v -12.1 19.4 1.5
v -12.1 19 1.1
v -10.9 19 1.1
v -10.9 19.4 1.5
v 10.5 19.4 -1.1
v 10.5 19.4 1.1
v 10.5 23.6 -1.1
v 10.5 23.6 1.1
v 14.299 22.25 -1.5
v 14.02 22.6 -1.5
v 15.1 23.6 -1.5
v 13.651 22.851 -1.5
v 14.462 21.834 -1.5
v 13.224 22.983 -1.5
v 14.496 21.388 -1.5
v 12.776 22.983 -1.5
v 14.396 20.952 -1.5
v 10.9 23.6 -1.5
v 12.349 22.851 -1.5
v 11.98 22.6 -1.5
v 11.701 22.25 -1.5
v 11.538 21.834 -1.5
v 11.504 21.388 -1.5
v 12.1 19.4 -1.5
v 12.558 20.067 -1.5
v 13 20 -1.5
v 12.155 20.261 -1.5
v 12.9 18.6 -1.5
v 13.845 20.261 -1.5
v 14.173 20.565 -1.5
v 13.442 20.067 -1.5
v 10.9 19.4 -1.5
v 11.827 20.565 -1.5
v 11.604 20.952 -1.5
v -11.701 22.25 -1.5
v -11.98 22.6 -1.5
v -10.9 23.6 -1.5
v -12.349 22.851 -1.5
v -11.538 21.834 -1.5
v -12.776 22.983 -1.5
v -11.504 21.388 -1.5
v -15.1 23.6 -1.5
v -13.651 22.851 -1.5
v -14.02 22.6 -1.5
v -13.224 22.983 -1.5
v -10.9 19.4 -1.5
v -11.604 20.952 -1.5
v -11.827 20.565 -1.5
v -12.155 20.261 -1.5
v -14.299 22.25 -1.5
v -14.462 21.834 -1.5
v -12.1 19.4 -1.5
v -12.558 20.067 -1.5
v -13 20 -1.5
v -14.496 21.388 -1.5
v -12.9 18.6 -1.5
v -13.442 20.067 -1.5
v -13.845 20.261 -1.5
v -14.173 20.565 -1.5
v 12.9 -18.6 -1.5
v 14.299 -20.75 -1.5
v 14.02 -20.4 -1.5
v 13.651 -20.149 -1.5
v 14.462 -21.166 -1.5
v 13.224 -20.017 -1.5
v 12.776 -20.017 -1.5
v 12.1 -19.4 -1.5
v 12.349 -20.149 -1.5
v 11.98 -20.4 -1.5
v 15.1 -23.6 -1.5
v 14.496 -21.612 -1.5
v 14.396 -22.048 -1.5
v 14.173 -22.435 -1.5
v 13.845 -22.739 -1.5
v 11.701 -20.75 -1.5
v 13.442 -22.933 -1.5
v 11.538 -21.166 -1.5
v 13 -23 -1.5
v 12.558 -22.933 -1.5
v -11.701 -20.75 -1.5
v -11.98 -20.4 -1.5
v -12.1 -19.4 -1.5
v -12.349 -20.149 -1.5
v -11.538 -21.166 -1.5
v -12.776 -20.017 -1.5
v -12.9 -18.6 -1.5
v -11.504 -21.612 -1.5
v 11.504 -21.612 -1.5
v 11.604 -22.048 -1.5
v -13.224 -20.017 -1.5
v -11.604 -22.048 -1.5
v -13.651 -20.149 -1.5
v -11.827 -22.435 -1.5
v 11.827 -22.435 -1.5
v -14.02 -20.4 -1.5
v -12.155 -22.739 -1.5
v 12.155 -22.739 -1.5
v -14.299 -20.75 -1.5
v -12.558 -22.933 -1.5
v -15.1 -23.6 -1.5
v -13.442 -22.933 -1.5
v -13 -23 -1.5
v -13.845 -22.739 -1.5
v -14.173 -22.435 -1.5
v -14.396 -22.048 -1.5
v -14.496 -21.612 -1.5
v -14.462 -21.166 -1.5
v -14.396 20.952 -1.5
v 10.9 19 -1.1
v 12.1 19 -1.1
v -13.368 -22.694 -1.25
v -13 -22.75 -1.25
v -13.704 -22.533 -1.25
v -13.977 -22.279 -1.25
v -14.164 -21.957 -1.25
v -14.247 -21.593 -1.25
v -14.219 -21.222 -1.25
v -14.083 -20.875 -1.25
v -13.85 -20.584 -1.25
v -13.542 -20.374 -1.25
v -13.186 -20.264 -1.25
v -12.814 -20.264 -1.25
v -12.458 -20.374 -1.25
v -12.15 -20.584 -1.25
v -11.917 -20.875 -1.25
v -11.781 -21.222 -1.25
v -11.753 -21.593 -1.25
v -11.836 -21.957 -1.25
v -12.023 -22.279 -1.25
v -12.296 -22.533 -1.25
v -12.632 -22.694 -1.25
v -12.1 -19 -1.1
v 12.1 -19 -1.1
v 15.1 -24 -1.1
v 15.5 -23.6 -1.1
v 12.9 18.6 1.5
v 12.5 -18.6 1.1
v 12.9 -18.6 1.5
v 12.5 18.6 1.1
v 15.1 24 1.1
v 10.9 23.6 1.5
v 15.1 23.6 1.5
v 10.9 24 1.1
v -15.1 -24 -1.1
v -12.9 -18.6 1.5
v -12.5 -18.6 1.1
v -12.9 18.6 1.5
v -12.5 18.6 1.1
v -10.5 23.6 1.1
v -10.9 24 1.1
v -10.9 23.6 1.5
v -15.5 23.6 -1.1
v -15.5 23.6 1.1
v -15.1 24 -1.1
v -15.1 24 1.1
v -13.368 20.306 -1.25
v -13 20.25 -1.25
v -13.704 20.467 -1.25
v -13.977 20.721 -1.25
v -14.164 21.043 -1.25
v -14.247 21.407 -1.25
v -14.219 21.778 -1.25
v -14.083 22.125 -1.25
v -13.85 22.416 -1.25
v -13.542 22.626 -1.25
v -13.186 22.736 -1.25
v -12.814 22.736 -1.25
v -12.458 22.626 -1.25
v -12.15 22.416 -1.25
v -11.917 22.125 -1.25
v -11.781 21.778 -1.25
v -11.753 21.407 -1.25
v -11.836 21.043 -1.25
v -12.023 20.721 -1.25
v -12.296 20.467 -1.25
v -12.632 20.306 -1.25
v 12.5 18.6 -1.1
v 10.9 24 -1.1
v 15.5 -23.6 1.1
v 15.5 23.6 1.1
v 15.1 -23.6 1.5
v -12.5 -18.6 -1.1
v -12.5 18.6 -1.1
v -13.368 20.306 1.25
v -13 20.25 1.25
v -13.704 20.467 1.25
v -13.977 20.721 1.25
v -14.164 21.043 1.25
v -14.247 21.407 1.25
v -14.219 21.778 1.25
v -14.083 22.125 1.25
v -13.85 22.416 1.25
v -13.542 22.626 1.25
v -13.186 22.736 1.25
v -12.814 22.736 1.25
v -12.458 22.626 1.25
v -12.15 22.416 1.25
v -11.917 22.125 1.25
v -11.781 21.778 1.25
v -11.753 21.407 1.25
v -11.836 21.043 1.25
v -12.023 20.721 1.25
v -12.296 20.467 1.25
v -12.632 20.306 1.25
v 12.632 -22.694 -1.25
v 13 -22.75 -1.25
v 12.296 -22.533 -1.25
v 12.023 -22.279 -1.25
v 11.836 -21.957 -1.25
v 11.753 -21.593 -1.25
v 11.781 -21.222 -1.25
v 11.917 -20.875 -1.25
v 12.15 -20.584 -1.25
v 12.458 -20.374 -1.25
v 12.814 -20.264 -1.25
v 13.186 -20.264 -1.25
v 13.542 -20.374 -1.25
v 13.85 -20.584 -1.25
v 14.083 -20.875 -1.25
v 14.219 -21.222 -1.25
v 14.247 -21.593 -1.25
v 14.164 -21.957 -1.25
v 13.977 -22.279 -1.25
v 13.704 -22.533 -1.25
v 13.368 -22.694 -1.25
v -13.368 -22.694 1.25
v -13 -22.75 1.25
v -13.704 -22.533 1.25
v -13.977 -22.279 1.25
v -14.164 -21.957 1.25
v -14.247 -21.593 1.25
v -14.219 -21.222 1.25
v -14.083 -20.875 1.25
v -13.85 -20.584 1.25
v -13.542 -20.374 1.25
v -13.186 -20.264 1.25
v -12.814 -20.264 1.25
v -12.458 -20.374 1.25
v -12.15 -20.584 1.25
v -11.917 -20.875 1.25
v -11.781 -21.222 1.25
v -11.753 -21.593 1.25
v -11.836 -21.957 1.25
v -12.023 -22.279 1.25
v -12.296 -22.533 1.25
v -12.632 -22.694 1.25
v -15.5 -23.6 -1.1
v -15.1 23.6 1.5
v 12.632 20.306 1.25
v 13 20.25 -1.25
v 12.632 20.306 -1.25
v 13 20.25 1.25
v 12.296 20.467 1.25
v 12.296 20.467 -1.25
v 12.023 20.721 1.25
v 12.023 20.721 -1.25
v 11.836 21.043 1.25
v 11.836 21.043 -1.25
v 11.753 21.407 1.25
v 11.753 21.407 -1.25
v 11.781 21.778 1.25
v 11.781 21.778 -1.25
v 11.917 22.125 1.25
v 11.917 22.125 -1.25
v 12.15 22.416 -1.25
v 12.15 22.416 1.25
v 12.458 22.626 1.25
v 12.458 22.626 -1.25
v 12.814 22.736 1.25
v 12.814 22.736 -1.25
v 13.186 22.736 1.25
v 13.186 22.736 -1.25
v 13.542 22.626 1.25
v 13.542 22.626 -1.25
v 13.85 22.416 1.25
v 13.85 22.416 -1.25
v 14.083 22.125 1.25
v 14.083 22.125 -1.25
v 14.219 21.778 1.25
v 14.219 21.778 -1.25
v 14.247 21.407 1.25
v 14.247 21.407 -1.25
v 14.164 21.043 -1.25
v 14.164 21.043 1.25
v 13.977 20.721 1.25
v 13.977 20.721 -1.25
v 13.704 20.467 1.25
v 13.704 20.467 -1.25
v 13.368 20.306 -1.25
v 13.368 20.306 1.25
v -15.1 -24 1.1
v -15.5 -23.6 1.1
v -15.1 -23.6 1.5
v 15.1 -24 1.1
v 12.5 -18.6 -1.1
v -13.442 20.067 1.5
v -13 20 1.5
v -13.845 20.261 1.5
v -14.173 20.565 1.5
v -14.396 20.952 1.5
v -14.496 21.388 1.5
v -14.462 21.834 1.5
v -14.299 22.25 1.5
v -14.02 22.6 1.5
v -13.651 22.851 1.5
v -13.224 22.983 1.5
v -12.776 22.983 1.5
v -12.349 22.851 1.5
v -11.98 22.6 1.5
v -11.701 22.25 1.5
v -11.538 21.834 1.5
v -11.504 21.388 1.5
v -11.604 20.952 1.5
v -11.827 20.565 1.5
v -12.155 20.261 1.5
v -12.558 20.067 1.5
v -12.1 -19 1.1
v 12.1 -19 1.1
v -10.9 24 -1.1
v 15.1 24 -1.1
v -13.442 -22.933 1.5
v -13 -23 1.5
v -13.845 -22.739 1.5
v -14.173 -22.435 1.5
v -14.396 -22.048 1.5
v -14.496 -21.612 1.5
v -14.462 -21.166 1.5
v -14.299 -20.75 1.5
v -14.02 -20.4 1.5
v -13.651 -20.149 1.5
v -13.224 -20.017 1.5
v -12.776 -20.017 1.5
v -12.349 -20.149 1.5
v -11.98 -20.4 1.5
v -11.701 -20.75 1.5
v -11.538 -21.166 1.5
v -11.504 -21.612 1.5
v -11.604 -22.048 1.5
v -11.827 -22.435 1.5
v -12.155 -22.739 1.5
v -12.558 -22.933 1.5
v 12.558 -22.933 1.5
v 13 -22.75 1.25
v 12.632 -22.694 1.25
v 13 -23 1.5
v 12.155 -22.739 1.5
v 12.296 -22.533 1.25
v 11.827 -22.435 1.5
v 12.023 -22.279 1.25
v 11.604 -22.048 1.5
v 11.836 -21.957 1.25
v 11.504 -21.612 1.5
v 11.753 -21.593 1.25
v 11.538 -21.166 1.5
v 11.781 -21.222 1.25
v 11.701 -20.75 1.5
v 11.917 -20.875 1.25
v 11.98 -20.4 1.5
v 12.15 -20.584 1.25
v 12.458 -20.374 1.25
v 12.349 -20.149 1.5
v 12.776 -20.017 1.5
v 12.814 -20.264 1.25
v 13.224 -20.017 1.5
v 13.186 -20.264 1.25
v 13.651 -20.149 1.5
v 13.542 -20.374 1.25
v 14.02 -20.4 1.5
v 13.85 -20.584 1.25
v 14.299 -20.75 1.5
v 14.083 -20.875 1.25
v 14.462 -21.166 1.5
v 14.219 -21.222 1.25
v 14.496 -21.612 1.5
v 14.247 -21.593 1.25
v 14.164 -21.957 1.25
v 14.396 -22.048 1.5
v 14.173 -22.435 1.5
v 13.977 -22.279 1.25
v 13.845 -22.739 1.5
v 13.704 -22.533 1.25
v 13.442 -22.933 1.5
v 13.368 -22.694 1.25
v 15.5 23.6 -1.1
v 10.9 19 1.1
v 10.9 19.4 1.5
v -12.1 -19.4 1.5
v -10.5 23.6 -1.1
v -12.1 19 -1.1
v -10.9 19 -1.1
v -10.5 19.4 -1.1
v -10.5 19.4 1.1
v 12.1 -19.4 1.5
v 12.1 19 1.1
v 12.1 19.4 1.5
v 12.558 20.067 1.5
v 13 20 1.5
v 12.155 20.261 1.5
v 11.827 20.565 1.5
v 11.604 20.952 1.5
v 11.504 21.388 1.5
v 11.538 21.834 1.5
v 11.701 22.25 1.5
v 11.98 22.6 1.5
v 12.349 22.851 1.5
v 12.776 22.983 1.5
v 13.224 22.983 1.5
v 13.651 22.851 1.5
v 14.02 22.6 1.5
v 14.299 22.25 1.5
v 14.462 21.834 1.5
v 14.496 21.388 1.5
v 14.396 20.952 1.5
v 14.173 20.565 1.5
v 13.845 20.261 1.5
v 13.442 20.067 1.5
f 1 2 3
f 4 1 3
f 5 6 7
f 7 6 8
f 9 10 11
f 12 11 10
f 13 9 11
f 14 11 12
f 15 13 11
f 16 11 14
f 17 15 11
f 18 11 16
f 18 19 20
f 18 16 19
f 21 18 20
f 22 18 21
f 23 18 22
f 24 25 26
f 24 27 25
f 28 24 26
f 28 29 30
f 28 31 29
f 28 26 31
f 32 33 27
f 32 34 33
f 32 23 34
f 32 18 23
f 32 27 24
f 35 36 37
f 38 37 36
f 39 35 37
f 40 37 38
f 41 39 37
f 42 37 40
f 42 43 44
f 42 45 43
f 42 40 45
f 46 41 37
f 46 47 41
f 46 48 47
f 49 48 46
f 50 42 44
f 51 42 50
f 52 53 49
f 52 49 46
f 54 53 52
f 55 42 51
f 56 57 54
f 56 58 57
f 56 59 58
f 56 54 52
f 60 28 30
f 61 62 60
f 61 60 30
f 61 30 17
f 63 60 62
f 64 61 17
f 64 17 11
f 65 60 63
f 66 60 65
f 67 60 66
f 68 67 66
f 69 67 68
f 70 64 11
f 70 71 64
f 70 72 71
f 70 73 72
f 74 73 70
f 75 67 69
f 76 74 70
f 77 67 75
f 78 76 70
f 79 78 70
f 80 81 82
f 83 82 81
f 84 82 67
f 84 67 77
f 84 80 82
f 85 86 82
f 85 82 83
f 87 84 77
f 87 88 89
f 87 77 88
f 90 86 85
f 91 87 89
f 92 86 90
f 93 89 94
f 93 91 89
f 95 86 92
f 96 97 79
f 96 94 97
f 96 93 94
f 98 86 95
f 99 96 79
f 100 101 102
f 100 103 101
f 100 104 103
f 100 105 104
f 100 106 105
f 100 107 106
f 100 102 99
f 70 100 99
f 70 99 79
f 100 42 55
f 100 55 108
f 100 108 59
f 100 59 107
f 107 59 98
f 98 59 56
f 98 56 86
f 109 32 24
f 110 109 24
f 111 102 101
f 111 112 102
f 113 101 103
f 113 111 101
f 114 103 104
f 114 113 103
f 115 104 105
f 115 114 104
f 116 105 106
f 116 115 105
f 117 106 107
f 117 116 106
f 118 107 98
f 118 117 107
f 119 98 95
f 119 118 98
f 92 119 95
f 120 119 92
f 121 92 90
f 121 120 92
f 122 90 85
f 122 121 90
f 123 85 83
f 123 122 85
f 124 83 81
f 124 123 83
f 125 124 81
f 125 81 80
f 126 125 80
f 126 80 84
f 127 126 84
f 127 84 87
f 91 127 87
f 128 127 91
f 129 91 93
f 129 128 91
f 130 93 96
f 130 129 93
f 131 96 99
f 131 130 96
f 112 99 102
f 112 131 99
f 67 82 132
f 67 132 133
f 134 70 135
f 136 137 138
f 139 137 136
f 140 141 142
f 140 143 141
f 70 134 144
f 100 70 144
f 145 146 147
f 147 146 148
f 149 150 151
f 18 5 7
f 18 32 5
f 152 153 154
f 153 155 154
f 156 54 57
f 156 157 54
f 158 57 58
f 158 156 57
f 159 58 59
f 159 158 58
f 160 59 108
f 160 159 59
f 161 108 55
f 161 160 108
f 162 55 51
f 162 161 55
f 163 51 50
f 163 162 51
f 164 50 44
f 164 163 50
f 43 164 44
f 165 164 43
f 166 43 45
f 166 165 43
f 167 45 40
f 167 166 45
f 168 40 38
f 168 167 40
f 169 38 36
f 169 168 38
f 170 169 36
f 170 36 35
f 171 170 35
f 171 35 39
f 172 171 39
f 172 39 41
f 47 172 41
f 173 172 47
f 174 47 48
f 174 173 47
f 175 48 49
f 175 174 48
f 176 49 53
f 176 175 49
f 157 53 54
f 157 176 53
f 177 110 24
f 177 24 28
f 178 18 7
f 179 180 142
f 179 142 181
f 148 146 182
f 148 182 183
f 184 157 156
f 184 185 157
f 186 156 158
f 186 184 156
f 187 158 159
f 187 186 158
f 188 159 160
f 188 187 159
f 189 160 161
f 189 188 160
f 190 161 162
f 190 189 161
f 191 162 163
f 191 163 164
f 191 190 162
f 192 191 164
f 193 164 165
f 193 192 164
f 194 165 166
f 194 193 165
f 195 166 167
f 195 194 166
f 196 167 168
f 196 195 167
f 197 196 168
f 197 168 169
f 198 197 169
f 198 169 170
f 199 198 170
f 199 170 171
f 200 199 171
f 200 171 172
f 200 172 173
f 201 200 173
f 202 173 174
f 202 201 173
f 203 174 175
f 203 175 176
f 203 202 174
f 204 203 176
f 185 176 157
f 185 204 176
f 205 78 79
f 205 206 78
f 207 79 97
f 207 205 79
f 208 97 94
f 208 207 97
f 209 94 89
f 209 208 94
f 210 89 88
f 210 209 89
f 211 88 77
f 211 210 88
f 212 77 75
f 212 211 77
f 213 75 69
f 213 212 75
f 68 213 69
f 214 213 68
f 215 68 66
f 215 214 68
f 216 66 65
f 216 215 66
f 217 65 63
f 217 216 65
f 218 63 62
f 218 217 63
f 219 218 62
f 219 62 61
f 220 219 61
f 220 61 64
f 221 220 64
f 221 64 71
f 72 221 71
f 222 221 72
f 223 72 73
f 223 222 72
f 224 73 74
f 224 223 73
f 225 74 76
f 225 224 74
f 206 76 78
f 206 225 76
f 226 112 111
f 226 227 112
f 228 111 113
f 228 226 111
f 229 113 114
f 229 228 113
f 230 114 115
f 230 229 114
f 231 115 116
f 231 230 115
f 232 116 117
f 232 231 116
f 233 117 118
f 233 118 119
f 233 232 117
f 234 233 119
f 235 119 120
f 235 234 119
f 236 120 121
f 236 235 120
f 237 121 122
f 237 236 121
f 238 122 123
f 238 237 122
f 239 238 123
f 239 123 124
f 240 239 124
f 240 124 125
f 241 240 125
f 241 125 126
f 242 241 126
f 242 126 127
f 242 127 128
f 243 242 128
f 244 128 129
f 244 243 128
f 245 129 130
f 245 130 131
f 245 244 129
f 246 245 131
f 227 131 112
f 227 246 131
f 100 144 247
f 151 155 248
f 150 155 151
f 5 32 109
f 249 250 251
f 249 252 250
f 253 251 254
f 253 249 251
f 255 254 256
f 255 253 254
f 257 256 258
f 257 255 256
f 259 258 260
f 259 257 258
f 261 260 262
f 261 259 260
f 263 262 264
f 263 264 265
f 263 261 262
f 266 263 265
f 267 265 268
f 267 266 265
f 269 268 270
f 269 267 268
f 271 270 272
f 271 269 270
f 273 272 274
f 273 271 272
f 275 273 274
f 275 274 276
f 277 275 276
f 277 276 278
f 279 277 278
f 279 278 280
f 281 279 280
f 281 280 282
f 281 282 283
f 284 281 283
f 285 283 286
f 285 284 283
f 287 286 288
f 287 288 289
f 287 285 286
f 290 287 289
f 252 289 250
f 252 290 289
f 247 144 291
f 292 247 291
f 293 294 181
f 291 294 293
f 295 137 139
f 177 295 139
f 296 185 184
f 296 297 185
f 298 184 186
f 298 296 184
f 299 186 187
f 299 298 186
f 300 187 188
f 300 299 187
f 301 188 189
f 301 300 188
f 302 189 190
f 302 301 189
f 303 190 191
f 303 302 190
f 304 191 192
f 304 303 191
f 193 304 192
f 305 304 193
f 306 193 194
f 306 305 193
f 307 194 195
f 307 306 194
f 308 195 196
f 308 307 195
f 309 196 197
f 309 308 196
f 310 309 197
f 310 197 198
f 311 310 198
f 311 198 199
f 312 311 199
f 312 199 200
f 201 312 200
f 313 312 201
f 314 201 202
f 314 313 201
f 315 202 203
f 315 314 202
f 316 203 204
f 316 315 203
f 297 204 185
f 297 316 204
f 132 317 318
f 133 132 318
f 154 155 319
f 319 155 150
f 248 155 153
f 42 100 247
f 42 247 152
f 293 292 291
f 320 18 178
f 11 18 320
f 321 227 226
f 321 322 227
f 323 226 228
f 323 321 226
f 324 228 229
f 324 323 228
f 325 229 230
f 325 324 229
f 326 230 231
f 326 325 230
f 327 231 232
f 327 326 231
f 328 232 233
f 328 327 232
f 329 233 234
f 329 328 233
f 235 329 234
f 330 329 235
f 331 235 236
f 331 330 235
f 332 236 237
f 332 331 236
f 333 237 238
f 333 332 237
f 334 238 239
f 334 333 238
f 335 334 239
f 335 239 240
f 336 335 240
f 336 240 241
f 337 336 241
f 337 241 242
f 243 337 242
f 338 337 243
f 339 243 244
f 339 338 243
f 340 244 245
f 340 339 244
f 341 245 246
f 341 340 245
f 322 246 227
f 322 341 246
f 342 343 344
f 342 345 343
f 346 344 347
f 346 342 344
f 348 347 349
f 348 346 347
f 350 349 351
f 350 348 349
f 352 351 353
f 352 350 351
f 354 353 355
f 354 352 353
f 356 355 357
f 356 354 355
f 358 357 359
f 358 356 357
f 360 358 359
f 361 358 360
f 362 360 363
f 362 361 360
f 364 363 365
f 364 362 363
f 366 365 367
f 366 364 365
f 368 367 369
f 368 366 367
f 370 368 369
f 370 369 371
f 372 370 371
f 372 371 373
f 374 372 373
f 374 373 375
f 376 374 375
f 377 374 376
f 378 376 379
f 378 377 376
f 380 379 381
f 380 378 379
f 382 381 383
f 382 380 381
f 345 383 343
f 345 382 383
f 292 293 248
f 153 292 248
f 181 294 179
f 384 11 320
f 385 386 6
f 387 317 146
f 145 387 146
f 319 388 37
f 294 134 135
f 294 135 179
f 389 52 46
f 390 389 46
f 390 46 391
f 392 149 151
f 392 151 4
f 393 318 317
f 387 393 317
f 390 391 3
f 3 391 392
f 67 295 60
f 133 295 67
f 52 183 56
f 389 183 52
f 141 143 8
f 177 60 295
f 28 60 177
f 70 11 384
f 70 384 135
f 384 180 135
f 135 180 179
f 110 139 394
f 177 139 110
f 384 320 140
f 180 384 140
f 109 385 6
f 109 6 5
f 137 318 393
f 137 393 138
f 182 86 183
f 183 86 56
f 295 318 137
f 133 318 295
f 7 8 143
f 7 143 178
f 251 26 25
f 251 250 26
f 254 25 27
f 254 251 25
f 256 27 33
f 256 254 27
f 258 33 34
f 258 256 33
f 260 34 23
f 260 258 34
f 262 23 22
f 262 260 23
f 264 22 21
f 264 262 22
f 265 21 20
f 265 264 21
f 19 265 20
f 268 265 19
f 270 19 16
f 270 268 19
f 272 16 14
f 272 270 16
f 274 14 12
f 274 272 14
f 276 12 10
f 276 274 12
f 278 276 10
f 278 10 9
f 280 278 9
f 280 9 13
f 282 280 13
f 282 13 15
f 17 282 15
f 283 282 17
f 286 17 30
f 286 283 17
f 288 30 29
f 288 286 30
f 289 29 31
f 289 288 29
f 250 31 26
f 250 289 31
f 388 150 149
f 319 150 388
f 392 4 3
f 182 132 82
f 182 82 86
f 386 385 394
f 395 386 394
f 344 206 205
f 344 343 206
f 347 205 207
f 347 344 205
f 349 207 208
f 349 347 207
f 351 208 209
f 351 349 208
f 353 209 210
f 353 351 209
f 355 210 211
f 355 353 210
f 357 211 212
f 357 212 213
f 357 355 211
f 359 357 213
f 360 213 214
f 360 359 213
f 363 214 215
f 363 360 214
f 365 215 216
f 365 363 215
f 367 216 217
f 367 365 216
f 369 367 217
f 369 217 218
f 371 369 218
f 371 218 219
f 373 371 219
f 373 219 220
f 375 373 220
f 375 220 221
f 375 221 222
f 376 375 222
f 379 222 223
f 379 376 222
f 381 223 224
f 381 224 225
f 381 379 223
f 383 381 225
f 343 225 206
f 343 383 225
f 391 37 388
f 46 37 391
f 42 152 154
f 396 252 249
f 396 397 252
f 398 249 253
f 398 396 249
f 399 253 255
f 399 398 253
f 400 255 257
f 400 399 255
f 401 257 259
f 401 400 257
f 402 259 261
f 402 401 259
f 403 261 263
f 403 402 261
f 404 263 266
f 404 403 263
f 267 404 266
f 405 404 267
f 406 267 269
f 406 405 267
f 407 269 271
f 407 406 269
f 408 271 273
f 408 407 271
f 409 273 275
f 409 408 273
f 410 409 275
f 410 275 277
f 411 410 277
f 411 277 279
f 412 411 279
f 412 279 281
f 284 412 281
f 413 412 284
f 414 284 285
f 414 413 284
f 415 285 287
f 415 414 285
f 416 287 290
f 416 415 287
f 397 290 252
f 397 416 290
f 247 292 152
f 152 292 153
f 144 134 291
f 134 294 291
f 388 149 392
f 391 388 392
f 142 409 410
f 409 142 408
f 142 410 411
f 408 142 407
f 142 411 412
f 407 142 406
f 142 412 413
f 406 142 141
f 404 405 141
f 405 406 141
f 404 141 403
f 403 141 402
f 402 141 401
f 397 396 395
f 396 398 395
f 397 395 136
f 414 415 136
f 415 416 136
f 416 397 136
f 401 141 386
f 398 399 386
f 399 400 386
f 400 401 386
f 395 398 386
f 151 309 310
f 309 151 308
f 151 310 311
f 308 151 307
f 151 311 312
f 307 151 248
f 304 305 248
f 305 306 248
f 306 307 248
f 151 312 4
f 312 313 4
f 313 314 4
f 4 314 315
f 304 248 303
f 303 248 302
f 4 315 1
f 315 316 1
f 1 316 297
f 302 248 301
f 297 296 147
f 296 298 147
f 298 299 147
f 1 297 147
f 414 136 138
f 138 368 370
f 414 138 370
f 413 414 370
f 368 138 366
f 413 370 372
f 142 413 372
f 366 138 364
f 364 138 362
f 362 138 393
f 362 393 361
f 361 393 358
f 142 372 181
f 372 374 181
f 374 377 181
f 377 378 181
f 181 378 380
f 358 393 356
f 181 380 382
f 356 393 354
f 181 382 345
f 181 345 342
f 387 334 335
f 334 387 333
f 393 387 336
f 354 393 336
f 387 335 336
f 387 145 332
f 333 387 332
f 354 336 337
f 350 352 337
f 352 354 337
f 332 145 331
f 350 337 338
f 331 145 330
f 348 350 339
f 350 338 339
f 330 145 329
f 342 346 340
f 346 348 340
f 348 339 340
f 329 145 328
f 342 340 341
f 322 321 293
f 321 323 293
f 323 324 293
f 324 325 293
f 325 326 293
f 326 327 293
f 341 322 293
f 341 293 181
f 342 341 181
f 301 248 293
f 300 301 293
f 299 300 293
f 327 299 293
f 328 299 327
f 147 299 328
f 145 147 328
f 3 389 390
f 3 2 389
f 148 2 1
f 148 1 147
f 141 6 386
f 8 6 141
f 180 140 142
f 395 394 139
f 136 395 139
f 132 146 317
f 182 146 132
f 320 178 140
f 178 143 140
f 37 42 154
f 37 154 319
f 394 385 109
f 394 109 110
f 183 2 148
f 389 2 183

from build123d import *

# Parameters (mm, degrees)
AUFSATZ_LINEAR_AUSTRAGEN1_DEPTH           = 1.5
F_2_5_2_5_DURCHMESSER_BOHRUNG1_AT_2_COUNT = 2
F_2_5_2_5_DURCHMESSER_BOHRUNG1_AT_2_PITCH = 25.124689053
F_2_5_2_5_DURCHMESSER_BOHRUNG1_AT_3_COUNT = 2
F_2_5_2_5_DURCHMESSER_BOHRUNG1_AT_3_PITCH = 25.124689053
F_2_5_2_5_DURCHMESSER_BOHRUNG1_AT_4_COUNT = 2
F_2_5_2_5_DURCHMESSER_BOHRUNG1_AT_4_PITCH = 25.124689053
F_2_5_2_5_DURCHMESSER_BOHRUNG1_AT_5_COUNT = 2
F_2_5_2_5_DURCHMESSER_BOHRUNG1_AT_5_PITCH = 25.124689053
SKIZZE4_W                                 = 25
SKIZZE4_H                                 = 38
SCHNITT_LINEAR_AUSTRAGEN1_DEPTH           = 3
FASE1_SIZE                                = 0.4


with BuildPart() as part:
    # Skizze1 → Aufsatz-Linear austragen1 (new, symmetric)
    with BuildSketch(Plane(origin=(0, 0, 0), x_dir=(0, 1, 0), z_dir=(0, 0, 1))):
        Polygon((-24, 15.5), (24, 15.5), (24, 10.5), (-19, 10.5), (-19, -10.5), (24, -10.5), (24, -15.5), (-24, -15.5), align=None)
    extrude(amount=AUFSATZ_LINEAR_AUSTRAGEN1_DEPTH, both=True)

    # Skizze3 → Ø2.5 (2.5) Durchmesser Bohrung1 (revolve, cut)
    with BuildSketch(Plane(origin=(0, 0, 1.5), x_dir=(0, -1, 0), z_dir=(1, 0, 0))):
        Polygon((0, 0), (0, 3), (1.5, 3), (1.25, 2.75), (1.25, 0.25), (1.5, 0), align=None)
    f_2_5_2_5_durchmesser_bohrung1 = revolve(axis=Axis((0, 0, 7.85), (0, 0, -1)), mode=Mode.SUBTRACT)

    # Ø2.5 (2.5) Durchmesser Bohrung1 at 2: Ø2.5 (2.5) Durchmesser Bohrung1 ×2
    with Locations(*[Vector(0.5174193389091943, 0.8557319835805908, 0) * (i * F_2_5_2_5_DURCHMESSER_BOHRUNG1_AT_2_PITCH) for i in range(1, F_2_5_2_5_DURCHMESSER_BOHRUNG1_AT_2_COUNT)]):
        add(f_2_5_2_5_durchmesser_bohrung1, mode=Mode.SUBTRACT)

    # Ø2.5 (2.5) Durchmesser Bohrung1 at 3: Ø2.5 (2.5) Durchmesser Bohrung1 ×2
    with Locations(*[Vector(-0.5174193389091943, -0.8557319835805908, 0) * (i * F_2_5_2_5_DURCHMESSER_BOHRUNG1_AT_3_PITCH) for i in range(1, F_2_5_2_5_DURCHMESSER_BOHRUNG1_AT_3_COUNT)]):
        add(f_2_5_2_5_durchmesser_bohrung1, mode=Mode.SUBTRACT)

    # Ø2.5 (2.5) Durchmesser Bohrung1 at 4: Ø2.5 (2.5) Durchmesser Bohrung1 ×2
    with Locations(*[Vector(0.5174193389091946, -0.8557319835805907, 0) * (i * F_2_5_2_5_DURCHMESSER_BOHRUNG1_AT_4_PITCH) for i in range(1, F_2_5_2_5_DURCHMESSER_BOHRUNG1_AT_4_COUNT)]):
        add(f_2_5_2_5_durchmesser_bohrung1, mode=Mode.SUBTRACT)

    # Ø2.5 (2.5) Durchmesser Bohrung1 at 5: Ø2.5 (2.5) Durchmesser Bohrung1 ×2
    with Locations(*[Vector(-0.5174193389091944, 0.8557319835805907, 0) * (i * F_2_5_2_5_DURCHMESSER_BOHRUNG1_AT_5_PITCH) for i in range(1, F_2_5_2_5_DURCHMESSER_BOHRUNG1_AT_5_COUNT)]):
        add(f_2_5_2_5_durchmesser_bohrung1, mode=Mode.SUBTRACT)

    # Skizze4 → Schnitt-Linear austragen1 (cut)
    with BuildSketch(Plane.XY.offset(1.5)):
        Rectangle(SKIZZE4_W, SKIZZE4_H)
    extrude(amount=-SCHNITT_LINEAR_AUSTRAGEN1_DEPTH, mode=Mode.SUBTRACT)

    # Fase1
    fase1_edges = [part.edges().sort_by_distance(p)[0] for p in [
        (10.5, 21.5, -1.5),
        (13, 24, -1.5),
        (15.5, 0, -1.5),
        (0, -24, -1.5),
        (13, 24, 1.5),
        (-15.5, -24, 0),
        (-15.5, 24, 0),
        (-10.5, 24, 0),
        (10.5, 24, 0),
        (15.5, 24, 0),
        (15.5, -24, 0),
        (10.5, 21.5, 1.5),
        (0, -19, 1.5),
        (-13, 24, 1.5),
        (-15.5, 0, 1.5),
        (0, -24, 1.5),
        (-10.5, 21.5, -1.5),
        (-11.5, 19, -1.5),
        (-10.5, 21.5, 1.5),
        (11.5, 19, 1.5),
        (12.5, 0, 1.5),
        (-11.5, 19, 1.5),
        (-12.5, 0, 1.5),
        (12.5, -19, 0),
        (11.5, 19, -1.5),
        (10.5, 19, 0),
        (-10.5, 19, 0),
        (-12.5, 19, 0),
        (12.5, 0, -1.5),
        (12.5, 19, 0),
        (-12.5, 0, -1.5),
        (-12.5, -19, 0),
        (-15.5, 0, -1.5),
        (15.5, 0, 1.5),
        (-13, 24, -1.5),
        (0, -19, -1.5),
    ]]
    chamfer(fase1_edges, length=FASE1_SIZE)


solid = part.part
